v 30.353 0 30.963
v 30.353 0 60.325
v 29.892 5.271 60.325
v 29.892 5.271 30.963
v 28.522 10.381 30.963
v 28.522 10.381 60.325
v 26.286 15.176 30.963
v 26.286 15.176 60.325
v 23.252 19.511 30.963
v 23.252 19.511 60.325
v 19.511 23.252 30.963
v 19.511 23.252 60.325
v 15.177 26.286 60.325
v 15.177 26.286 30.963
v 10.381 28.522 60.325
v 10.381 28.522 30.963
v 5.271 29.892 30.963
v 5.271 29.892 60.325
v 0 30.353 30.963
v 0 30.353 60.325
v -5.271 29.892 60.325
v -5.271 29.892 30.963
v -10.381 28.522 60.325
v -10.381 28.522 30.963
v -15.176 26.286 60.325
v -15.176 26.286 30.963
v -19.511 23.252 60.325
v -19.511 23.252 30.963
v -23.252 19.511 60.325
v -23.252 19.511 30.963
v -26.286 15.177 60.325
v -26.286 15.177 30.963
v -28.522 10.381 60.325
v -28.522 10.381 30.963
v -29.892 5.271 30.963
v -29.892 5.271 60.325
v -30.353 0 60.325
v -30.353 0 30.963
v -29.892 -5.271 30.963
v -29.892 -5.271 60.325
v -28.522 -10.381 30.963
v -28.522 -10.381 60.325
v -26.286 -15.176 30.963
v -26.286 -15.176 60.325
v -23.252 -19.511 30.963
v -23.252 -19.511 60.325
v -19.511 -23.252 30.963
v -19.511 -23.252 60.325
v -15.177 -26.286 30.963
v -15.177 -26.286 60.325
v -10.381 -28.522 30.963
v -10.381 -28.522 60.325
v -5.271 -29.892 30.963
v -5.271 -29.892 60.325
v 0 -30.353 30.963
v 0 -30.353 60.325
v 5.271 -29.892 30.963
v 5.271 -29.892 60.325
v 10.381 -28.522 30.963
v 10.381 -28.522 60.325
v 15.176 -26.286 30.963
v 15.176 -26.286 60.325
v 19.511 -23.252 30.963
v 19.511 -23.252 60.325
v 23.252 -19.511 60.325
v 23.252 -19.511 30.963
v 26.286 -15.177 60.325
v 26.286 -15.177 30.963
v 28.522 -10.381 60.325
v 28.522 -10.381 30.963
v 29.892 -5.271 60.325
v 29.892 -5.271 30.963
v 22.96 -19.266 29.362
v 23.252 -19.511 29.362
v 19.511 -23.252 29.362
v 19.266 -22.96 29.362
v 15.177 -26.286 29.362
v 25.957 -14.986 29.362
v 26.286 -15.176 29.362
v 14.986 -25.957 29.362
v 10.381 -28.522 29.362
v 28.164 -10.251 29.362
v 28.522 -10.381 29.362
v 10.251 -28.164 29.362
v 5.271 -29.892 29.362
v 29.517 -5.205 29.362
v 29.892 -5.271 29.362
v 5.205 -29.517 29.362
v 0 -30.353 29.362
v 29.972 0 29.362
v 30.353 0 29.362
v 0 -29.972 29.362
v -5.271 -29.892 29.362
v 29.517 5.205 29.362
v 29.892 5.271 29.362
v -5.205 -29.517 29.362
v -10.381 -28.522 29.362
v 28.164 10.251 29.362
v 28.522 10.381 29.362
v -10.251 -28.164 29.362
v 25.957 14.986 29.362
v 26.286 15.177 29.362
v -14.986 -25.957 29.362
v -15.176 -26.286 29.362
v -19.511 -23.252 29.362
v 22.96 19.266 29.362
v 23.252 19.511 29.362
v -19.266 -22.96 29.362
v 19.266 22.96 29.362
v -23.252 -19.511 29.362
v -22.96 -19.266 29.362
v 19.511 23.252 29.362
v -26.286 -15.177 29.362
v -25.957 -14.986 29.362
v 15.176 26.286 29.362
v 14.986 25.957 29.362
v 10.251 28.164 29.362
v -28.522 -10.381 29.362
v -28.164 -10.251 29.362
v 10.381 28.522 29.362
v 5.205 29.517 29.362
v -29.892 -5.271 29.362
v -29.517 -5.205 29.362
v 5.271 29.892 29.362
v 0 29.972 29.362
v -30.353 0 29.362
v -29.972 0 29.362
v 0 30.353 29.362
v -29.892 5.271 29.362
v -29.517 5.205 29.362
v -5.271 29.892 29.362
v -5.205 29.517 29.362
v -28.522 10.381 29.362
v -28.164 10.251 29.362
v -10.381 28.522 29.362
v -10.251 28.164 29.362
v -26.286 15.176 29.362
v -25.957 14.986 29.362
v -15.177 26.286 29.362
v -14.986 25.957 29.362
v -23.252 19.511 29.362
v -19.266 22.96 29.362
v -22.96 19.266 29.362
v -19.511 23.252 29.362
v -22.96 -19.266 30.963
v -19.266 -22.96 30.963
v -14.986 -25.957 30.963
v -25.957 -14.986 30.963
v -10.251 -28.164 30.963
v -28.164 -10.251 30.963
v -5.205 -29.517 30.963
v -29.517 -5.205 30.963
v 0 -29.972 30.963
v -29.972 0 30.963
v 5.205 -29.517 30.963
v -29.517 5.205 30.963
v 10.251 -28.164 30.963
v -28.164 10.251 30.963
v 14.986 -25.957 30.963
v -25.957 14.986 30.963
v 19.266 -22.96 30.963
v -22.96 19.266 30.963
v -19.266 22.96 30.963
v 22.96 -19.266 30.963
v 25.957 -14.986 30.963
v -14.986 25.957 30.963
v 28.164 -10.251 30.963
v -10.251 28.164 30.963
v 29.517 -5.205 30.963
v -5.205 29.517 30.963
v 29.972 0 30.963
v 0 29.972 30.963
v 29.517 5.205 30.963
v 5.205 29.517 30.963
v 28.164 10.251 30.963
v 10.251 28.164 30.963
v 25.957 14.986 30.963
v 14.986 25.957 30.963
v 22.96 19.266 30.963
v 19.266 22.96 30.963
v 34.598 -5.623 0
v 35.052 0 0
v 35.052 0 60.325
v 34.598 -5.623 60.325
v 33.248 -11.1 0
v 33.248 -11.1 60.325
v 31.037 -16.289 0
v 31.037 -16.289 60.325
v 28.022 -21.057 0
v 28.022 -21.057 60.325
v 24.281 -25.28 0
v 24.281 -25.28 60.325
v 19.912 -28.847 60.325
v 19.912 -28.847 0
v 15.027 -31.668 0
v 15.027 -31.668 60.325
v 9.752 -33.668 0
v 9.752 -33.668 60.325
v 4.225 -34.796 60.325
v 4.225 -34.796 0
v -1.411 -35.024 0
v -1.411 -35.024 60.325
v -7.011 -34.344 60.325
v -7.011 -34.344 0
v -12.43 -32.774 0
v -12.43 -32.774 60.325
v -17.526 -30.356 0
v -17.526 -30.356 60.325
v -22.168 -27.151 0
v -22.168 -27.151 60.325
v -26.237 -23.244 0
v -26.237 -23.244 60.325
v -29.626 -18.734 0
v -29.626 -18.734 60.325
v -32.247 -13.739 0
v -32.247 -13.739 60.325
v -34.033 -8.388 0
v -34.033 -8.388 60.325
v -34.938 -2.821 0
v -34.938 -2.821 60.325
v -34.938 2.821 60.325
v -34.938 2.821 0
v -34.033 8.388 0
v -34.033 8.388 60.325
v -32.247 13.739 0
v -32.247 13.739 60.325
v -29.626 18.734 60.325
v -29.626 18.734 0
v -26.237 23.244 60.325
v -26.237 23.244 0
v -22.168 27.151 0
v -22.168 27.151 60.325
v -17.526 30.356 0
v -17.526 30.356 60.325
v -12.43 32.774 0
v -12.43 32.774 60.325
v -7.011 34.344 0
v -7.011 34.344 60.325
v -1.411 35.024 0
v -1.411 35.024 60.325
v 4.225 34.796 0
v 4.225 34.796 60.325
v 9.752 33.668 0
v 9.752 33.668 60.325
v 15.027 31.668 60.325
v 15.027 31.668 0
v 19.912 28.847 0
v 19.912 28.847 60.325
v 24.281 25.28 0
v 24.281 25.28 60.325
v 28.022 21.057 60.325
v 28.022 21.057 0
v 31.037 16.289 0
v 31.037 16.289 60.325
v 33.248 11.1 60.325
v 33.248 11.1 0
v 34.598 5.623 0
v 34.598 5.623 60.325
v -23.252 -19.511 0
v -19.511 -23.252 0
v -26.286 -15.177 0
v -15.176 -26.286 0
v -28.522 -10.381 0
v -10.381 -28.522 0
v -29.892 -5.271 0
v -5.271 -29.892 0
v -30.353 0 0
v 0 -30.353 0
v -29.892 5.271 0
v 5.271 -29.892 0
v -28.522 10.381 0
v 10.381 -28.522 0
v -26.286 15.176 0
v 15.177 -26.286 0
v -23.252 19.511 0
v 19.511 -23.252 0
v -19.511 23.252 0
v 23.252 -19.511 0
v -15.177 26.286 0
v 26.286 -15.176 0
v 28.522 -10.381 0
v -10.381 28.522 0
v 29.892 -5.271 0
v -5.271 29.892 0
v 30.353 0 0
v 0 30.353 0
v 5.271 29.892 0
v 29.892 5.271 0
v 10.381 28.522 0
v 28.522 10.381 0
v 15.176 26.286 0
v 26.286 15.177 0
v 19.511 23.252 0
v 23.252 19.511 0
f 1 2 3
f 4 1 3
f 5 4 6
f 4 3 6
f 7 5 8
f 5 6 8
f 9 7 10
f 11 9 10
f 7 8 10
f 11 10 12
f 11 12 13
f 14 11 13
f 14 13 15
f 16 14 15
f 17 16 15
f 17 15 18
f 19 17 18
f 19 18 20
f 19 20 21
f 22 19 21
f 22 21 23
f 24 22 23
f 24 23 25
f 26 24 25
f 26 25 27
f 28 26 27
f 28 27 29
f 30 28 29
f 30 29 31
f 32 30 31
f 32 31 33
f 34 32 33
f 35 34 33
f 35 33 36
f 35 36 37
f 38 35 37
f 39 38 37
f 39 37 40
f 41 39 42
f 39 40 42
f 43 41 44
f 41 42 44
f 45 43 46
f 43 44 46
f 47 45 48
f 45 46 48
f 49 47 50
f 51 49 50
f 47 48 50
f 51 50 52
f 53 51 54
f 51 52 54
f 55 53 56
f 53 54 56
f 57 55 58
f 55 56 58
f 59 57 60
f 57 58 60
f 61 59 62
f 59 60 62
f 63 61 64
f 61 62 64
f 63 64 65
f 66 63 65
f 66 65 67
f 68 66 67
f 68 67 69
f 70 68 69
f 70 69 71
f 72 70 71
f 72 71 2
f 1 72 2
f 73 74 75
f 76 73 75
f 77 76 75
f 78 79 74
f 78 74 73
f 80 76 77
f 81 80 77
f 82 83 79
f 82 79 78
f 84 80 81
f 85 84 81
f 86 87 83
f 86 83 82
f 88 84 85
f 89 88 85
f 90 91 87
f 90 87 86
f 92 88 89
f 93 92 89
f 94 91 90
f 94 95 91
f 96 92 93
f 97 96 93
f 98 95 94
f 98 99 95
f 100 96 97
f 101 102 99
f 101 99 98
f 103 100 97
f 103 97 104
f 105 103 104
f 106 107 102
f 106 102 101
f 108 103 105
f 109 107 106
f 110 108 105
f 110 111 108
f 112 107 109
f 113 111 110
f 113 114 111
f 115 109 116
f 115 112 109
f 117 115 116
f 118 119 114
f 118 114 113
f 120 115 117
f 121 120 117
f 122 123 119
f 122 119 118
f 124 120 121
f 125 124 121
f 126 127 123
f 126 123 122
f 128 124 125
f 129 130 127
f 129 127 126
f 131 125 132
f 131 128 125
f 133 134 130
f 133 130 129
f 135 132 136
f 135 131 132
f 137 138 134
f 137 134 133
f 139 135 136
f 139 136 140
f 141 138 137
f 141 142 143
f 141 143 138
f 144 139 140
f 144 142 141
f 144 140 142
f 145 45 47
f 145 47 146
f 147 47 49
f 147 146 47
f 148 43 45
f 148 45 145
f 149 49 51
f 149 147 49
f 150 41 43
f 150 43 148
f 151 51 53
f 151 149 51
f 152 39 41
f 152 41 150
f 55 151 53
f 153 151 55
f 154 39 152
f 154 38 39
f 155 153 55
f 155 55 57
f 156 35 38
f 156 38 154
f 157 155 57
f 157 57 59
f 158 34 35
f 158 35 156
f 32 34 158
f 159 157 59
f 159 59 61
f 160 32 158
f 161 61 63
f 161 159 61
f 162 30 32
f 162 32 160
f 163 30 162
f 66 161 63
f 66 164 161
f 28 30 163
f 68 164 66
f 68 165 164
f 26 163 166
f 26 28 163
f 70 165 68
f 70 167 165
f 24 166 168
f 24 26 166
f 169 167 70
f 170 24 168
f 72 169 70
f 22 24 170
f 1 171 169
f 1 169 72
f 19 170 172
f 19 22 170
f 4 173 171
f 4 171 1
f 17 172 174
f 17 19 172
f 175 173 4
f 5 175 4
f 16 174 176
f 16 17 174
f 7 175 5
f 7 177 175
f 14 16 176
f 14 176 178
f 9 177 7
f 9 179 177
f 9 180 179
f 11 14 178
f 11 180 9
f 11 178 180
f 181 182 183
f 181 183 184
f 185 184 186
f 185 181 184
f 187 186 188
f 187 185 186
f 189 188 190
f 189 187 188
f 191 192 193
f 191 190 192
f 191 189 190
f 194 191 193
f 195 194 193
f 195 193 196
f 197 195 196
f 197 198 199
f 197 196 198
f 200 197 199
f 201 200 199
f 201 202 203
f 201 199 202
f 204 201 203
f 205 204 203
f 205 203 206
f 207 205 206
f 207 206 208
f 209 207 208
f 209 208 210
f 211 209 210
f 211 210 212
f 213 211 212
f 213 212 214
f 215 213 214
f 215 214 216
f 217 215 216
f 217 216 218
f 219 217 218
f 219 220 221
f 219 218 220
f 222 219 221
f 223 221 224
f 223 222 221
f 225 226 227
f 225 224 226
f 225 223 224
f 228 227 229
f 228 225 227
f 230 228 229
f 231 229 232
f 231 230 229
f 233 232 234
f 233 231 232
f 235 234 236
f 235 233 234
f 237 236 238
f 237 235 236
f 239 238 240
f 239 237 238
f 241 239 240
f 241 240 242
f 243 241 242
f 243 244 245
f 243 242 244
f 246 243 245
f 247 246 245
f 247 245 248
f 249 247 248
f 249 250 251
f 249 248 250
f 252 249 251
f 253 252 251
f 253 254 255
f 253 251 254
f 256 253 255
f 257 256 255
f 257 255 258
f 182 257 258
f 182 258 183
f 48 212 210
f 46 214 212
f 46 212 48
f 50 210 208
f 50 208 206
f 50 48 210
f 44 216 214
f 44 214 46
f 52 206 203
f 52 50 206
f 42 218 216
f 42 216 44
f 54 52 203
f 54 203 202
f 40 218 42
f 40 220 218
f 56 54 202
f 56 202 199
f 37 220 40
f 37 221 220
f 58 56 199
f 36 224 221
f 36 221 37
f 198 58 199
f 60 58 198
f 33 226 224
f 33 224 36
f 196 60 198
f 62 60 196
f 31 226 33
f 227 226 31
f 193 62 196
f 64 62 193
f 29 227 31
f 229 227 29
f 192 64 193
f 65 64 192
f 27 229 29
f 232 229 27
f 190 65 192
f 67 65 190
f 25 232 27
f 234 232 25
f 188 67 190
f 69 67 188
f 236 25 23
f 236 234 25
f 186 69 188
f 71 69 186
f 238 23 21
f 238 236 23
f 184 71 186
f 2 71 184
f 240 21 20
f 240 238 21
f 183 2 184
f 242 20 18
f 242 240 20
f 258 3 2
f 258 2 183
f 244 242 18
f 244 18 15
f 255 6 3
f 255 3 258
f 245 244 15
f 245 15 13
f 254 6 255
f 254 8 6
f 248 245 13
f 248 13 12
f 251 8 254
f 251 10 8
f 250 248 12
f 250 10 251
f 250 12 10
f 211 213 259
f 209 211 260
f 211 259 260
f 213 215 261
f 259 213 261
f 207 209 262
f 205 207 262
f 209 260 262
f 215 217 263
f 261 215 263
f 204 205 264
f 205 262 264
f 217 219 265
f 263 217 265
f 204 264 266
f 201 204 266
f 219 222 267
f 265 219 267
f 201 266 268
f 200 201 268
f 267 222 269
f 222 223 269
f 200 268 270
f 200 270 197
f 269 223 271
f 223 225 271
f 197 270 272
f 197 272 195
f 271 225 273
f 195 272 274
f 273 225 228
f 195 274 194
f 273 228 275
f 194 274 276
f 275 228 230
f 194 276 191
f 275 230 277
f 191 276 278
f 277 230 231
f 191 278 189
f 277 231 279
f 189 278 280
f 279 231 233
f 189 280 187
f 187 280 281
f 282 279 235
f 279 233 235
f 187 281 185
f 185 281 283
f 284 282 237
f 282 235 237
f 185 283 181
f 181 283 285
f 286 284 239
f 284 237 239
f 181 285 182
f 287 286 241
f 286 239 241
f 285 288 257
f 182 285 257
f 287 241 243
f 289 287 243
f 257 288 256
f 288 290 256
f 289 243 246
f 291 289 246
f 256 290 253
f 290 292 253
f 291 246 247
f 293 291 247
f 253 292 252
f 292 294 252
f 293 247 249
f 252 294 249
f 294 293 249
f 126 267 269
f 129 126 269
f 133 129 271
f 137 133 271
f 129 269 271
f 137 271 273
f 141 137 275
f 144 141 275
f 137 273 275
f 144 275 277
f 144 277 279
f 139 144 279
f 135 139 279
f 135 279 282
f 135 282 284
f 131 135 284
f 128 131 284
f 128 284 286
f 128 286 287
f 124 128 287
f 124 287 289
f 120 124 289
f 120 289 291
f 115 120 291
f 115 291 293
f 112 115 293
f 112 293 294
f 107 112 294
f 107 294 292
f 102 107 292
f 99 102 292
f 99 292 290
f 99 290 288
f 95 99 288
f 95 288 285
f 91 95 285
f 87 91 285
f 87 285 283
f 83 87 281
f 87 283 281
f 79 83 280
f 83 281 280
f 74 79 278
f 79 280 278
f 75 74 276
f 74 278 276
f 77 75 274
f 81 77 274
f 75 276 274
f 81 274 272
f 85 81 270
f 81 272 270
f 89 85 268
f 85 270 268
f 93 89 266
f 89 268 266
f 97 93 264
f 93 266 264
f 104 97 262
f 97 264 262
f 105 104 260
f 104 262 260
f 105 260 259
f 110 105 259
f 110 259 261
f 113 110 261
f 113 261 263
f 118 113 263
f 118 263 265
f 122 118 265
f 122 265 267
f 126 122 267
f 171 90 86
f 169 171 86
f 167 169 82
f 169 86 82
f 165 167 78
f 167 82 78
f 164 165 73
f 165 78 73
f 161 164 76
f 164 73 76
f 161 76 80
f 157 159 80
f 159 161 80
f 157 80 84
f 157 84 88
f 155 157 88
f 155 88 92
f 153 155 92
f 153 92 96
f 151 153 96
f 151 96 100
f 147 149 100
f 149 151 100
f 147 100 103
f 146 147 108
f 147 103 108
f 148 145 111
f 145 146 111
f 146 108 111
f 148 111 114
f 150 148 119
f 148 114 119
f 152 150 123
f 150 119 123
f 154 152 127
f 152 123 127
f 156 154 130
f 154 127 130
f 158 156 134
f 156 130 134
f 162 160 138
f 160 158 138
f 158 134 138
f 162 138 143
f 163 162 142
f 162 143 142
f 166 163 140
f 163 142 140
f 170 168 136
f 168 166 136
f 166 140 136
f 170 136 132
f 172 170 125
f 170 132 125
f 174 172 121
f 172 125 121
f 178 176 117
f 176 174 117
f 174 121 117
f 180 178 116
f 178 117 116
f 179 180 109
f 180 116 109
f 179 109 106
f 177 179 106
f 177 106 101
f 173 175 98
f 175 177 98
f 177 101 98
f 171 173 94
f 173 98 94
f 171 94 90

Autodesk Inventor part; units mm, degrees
ref_plane "YZ Plane" through (0, 0, 0) normal (1, 0, 0) x (0, 1, 0)
ref_plane "XZ Plane" through (0, 0, 0) normal (0, 1, 0) x (-1, 0, 0)
ref_plane "XY Plane" through (0, 0, 0) normal (0, 0, 1) x (1, 0, 0)
sketch "Sketch1" plane through (0, 0, 0) normal (0, 0, 1) x (1, 0, 0)
  circle A0 centre (0, 0) radius 29.972
  circle A1 centre (0, 0) radius 35.052
  dimension "d0" = 59.944
  dimension "d1" = 5.08
extrude "Extrusion1" add sketch "Sketch1" along normal blind 60.325
sketch "Sketch3" plane through (0, 0, 60.325) normal (0, 0, 1) x (1, 0, 0)
  circle A0 centre (0, 0) radius 29.972 projected
  circle A1 centre (0, 0) radius 35.052 projected
  circle A2 centre (0, 0) radius 30.353
  dimension "d4" = 60.706
extrude "Extrusion2" cut sketch "Sketch3" against normal blind 29.3624 contours A2
sketch "Sketch4" plane through (0, 0, 0) normal (0, 0, -1) x (-1, 0, 0)
  circle A0 centre (0, 0) radius 29.972 projected
  circle A1 centre (0, 0) radius 35.052 projected
  circle A2 centre (0, 0) radius 30.353
  dimension "d7" = 60.706
extrude "Extrusion3" cut sketch "Sketch4" against normal blind 29.3624 contours A2
properties part number "coupler_2in" material "PVC-Piping"
